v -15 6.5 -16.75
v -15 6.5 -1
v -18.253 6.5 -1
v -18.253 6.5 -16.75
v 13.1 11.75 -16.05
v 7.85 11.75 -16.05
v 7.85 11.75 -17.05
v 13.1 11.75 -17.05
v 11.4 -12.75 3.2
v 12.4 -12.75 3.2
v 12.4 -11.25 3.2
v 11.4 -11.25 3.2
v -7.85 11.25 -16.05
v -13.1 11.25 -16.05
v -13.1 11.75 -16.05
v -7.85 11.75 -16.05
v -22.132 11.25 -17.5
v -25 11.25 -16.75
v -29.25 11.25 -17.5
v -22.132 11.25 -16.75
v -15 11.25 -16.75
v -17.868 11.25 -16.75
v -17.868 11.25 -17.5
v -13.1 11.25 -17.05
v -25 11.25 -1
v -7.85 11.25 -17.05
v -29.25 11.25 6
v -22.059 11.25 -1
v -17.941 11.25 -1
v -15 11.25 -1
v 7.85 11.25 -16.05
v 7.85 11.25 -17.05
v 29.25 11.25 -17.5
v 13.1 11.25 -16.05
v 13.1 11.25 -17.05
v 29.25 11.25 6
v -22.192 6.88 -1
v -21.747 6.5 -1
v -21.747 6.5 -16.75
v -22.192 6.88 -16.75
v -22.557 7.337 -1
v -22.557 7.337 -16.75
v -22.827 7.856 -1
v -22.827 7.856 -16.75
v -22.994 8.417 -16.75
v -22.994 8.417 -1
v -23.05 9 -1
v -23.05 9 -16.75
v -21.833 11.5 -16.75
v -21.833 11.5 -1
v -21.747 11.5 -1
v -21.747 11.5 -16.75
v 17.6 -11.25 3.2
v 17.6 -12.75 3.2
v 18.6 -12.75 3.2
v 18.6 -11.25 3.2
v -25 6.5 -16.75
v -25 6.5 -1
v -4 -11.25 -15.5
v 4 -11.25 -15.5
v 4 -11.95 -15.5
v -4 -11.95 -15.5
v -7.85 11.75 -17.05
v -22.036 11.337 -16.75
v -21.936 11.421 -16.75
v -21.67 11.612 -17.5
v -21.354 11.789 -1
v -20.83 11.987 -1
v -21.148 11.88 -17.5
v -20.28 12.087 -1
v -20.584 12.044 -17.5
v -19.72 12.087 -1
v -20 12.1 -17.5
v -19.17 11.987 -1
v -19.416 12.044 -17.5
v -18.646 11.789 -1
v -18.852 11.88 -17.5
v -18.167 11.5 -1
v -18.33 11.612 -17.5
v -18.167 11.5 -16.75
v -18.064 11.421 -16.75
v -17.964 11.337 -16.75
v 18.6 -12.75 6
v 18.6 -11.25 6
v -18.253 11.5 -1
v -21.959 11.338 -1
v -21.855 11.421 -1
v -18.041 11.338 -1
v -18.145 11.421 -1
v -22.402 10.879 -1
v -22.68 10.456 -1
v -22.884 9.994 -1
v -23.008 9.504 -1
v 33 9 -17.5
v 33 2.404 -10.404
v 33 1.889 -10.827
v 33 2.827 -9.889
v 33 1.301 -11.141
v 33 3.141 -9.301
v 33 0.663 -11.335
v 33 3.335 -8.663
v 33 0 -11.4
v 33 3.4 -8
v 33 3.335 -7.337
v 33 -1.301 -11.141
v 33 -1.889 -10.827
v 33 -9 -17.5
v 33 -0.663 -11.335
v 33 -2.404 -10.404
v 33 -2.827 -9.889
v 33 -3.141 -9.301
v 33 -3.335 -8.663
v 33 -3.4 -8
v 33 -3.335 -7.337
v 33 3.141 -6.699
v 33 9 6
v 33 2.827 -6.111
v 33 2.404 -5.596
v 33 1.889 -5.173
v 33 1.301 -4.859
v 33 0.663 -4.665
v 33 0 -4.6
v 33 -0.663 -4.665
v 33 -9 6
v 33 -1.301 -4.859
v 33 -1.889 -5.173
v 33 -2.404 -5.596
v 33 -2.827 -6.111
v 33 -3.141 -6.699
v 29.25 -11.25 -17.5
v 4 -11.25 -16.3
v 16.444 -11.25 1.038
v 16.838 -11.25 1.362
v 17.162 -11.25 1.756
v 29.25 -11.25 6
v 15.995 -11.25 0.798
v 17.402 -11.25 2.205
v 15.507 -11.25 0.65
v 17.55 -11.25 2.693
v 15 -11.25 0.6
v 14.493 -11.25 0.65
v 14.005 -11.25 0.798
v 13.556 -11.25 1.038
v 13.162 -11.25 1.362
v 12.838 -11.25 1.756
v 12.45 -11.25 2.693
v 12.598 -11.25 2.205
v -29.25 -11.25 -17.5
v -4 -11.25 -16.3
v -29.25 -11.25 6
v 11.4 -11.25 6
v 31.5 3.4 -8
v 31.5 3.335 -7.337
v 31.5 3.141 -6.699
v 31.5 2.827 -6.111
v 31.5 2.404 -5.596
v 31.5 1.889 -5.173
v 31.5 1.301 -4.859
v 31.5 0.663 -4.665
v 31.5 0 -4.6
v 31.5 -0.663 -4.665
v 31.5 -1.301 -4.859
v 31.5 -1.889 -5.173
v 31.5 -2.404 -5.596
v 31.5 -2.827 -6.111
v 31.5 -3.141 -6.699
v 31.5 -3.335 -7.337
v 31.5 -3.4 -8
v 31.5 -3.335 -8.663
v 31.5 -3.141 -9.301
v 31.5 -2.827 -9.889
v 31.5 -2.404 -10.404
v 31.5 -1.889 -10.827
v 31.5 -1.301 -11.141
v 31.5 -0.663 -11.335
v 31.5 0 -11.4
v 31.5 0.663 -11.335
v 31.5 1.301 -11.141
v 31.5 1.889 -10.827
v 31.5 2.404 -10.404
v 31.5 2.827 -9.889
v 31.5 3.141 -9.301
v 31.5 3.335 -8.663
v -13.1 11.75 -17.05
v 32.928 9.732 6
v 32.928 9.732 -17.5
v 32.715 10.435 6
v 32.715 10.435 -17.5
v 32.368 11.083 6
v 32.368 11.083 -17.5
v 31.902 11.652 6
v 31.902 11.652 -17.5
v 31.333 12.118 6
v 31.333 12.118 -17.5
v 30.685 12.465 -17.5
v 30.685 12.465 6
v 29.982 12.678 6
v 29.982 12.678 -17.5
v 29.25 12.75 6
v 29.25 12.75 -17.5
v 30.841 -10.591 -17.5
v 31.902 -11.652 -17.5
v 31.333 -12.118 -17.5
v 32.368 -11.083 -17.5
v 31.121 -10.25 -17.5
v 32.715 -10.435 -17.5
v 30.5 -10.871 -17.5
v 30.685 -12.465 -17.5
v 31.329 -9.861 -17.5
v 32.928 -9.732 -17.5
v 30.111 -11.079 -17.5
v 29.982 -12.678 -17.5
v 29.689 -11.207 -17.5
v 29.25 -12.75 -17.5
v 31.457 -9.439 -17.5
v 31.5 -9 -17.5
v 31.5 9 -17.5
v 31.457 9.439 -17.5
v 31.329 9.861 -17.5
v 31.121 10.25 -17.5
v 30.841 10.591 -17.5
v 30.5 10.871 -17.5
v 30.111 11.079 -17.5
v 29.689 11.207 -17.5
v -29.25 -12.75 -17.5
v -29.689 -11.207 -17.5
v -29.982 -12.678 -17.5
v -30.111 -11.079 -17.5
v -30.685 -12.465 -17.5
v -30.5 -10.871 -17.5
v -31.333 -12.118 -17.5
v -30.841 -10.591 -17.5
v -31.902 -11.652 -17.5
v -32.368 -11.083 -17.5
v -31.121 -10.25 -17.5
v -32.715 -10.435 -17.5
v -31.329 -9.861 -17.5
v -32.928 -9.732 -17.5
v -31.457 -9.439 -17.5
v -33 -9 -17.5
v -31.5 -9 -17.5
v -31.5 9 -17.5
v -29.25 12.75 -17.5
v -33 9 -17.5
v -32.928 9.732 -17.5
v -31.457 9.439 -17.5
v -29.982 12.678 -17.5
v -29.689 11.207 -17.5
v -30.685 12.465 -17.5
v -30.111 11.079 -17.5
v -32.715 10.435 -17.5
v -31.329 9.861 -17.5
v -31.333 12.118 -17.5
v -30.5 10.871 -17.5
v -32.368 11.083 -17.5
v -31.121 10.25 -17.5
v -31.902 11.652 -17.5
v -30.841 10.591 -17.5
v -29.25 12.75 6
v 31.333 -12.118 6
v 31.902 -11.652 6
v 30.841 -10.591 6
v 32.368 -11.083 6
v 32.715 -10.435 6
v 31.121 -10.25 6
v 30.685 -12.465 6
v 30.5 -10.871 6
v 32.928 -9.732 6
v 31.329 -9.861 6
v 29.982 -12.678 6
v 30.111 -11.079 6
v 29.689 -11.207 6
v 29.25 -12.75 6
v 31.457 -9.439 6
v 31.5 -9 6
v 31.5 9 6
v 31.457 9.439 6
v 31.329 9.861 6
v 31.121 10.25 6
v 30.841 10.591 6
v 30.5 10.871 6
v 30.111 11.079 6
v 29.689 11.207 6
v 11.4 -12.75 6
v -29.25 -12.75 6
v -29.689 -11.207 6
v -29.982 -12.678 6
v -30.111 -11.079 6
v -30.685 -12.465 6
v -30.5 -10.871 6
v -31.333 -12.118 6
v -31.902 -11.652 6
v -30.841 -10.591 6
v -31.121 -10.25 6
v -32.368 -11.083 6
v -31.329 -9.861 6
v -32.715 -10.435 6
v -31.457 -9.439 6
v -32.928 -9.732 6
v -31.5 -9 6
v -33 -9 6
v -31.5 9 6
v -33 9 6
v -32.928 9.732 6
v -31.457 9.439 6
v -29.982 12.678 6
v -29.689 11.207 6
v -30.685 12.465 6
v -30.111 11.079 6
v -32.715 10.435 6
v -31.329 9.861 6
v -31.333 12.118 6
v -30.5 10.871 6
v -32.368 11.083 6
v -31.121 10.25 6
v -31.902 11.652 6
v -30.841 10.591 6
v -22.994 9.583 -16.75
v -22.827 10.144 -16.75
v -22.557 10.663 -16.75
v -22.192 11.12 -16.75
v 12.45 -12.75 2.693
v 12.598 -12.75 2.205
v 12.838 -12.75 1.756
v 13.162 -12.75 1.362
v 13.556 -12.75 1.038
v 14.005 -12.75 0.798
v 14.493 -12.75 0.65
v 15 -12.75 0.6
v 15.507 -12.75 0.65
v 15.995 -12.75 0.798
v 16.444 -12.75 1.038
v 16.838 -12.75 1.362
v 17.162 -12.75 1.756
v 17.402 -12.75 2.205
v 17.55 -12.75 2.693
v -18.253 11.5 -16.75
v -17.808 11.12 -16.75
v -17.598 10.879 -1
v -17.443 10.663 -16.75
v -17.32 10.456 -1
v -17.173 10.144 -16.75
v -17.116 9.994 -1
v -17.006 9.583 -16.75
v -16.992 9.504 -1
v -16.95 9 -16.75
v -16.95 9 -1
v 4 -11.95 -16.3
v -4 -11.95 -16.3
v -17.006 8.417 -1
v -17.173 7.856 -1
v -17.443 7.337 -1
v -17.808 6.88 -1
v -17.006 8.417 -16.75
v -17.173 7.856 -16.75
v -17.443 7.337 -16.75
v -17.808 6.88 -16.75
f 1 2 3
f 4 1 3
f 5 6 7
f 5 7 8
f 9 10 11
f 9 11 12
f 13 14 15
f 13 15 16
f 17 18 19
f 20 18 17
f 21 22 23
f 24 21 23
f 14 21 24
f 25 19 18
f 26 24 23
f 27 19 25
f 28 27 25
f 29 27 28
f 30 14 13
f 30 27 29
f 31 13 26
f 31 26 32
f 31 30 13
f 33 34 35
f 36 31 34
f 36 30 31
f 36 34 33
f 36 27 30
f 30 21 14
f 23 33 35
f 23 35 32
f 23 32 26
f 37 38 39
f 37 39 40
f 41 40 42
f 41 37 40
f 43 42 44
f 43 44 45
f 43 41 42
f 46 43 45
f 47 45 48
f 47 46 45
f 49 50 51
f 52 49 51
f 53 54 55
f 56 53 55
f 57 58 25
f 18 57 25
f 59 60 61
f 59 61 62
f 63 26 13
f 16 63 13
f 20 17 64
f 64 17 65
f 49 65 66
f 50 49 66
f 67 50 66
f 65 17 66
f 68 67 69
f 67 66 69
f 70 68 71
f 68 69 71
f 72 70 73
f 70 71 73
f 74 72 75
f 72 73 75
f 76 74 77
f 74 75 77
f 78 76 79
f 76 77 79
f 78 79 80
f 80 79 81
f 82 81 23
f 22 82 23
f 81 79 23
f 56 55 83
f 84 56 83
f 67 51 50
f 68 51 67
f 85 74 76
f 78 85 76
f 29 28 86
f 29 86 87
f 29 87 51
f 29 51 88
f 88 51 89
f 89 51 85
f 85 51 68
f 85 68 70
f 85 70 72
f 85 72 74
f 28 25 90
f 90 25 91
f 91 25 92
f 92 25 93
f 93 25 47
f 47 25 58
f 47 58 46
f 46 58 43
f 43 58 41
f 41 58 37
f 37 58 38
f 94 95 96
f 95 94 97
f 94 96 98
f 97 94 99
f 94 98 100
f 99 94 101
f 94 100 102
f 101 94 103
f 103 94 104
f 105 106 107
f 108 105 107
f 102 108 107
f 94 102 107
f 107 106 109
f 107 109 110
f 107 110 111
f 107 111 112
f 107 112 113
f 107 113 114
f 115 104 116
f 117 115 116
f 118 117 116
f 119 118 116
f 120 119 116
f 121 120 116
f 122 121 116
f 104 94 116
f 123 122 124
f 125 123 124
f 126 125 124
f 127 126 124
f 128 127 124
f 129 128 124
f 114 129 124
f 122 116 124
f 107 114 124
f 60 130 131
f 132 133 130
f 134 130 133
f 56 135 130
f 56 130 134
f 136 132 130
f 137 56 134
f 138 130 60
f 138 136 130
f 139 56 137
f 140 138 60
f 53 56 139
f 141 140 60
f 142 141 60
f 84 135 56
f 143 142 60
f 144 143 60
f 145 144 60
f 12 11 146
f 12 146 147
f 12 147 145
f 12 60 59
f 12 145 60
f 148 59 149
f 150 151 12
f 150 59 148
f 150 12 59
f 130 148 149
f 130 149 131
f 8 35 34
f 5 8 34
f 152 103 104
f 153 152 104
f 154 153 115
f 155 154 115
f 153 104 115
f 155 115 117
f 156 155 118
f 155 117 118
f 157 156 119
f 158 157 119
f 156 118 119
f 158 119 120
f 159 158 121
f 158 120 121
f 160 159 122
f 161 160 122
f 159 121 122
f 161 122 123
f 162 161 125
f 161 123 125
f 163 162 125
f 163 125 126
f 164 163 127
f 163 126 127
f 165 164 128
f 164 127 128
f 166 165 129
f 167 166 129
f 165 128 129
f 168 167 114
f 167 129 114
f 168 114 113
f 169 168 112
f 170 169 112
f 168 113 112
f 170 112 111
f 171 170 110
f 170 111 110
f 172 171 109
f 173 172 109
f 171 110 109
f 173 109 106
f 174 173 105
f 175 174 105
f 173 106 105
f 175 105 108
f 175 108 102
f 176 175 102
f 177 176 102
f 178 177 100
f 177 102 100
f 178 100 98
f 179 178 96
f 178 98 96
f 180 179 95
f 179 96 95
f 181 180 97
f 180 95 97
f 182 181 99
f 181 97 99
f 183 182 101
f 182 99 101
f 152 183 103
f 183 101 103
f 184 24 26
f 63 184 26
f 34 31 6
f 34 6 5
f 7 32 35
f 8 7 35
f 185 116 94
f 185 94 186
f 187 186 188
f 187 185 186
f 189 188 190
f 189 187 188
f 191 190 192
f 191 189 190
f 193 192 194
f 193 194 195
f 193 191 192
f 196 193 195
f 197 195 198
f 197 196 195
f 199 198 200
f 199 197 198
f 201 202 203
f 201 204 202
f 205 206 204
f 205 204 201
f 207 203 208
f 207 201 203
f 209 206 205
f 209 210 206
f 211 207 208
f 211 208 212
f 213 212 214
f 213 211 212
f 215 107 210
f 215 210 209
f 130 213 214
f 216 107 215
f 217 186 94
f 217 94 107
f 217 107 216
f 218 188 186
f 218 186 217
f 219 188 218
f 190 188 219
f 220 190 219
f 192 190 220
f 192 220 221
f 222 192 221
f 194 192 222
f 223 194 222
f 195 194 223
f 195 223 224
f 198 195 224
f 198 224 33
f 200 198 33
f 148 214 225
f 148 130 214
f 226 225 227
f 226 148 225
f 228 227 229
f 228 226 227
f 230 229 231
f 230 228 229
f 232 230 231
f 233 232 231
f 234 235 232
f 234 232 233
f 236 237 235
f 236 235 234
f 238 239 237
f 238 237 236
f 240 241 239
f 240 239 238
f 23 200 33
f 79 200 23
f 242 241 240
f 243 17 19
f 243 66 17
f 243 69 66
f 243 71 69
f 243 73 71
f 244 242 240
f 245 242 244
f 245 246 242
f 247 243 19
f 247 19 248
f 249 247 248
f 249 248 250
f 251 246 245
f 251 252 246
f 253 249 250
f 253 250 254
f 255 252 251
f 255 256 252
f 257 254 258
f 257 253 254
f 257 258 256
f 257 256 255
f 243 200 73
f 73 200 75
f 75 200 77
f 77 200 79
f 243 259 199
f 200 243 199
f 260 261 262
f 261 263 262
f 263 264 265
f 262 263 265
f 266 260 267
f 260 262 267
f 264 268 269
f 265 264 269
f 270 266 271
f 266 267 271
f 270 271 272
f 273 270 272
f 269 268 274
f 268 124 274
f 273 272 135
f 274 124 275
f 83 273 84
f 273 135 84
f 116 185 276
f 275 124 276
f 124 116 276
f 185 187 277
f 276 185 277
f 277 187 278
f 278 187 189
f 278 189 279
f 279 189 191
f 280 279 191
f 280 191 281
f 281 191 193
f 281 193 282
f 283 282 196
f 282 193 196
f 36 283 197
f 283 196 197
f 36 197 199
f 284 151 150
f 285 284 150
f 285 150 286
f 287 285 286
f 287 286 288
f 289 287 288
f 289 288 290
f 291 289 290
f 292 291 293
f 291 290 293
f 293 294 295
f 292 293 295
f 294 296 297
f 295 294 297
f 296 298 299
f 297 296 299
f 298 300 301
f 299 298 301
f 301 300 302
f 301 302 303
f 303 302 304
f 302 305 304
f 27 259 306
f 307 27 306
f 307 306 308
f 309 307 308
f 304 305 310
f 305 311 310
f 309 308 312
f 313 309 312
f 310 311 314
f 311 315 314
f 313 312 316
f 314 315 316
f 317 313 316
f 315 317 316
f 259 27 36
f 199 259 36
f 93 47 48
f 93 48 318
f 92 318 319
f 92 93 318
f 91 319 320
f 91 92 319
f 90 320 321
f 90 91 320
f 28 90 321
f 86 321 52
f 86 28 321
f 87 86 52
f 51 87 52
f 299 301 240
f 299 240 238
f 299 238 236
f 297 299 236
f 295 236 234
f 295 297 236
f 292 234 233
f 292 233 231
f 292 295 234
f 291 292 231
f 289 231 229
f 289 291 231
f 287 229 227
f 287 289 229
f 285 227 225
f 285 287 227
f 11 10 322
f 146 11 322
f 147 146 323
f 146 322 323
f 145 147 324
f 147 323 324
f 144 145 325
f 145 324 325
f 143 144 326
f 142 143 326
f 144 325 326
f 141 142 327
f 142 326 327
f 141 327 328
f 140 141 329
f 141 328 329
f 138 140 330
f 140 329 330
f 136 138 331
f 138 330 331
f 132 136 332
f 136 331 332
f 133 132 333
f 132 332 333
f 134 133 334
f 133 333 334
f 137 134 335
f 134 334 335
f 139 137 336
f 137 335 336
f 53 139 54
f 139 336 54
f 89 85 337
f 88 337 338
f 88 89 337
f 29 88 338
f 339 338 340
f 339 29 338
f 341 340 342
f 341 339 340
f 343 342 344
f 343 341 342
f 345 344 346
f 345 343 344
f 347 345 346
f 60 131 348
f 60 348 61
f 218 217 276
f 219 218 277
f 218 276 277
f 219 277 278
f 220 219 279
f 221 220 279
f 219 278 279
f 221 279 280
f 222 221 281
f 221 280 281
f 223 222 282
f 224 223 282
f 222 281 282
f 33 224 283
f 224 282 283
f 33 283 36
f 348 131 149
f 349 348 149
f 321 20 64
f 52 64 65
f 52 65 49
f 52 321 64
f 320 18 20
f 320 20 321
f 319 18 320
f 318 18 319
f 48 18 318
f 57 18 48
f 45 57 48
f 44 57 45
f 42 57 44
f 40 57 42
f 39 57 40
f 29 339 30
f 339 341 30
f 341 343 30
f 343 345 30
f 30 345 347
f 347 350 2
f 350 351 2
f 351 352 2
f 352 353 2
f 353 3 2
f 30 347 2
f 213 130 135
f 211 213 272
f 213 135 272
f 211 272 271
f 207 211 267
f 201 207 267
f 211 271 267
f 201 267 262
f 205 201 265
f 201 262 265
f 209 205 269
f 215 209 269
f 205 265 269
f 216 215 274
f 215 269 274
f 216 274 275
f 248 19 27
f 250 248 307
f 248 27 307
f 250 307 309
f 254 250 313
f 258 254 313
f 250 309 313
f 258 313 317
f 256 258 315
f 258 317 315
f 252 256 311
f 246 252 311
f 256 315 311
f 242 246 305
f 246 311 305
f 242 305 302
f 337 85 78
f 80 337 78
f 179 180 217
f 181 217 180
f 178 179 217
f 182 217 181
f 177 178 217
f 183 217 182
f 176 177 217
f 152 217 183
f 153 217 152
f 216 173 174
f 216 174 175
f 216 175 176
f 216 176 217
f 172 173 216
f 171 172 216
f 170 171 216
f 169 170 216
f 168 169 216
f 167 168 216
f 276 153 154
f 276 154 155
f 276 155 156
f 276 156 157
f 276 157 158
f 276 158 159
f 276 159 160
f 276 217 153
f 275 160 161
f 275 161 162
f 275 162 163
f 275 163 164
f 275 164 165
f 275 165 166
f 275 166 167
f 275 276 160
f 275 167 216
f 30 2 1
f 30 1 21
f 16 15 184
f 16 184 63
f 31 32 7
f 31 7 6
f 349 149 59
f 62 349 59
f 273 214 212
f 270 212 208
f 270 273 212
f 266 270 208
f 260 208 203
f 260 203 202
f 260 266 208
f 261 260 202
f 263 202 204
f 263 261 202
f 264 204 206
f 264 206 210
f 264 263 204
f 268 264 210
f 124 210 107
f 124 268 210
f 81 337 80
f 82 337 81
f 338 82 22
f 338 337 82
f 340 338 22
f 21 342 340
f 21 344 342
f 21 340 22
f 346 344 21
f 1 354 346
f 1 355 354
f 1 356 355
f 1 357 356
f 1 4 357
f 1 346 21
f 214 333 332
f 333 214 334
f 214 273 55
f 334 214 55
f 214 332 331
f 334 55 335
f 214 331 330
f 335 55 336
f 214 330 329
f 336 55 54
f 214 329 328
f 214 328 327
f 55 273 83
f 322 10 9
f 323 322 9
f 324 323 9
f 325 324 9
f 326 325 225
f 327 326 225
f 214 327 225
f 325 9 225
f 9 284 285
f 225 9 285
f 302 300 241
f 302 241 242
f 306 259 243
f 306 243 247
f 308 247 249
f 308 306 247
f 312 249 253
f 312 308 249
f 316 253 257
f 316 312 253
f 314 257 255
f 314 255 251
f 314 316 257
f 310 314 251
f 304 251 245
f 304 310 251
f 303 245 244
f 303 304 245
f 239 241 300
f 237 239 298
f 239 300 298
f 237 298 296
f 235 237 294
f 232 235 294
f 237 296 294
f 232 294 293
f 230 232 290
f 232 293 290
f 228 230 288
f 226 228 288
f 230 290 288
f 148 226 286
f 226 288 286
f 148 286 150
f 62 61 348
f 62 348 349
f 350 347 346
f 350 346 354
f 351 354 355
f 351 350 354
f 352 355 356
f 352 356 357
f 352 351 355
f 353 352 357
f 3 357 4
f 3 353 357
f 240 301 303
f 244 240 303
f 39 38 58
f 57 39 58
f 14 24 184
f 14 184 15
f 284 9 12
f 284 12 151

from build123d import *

# Parameters (mm, degrees)
PAD_DEPTH       = 23.5
SKETCH014_W     = 8
SKETCH014_H     = 0.8
POCKET001_DEPTH = 0.7
SKETCH015_W     = 5.25
SKETCH015_H     = 1
POCKET002_DEPTH = 0.5
SKETCH020_R     = 3.4
POCKET005_DEPTH = 1.5
POCKET006_DEPTH = 1.5
SKETCH025_R     = 3.1
POCKET008_DEPTH = 16.5
PAD015_DEPTH    = 15.75


with BuildPart() as part:
    # Sketch → Pad (new body)
    with BuildSketch(Plane.XY.offset(6)):
        with BuildLine():
            Line((-29.25, 12.75), (29.25, 12.75))
            ThreePointArc((33, 9), (31.9016504294, 11.6516504294), (29.25, 12.75))
            Line((33, 9), (33, -9))
            ThreePointArc((29.25, -12.75), (31.9016504295, -11.6516504294), (33, -9))
            Line((29.25, -12.75), (-29.25, -12.75))
            ThreePointArc((-33, -9), (-31.9016504294, -11.6516504295), (-29.25, -12.75))
            Line((-33, -9), (-33, 9))
            ThreePointArc((-29.25, 12.75), (-31.9016504294, 11.6516504294), (-33, 9))
        make_face()
        with BuildLine():
            Line((-29.25, 11.25), (29.25, 11.25))
            ThreePointArc((31.5, 9), (30.8409902577, 10.5909902577), (29.25, 11.25))
            Line((31.5, 9), (31.5, -9))
            ThreePointArc((29.25, -11.25), (30.8409902577, -10.5909902577), (31.5, -9))
            Line((29.25, -11.25), (-29.25, -11.25))
            ThreePointArc((-31.5, -9), (-30.8409902577, -10.5909902577), (-29.25, -11.25))
            Line((-31.5, -9), (-31.5, 9))
            ThreePointArc((-29.25, 11.25), (-30.8409902577, 10.5909902577), (-31.5, 9))
        make_face(mode=Mode.SUBTRACT)
    extrude(amount=-PAD_DEPTH)

    # Sketch014 → Pocket001 (cut)
    with BuildSketch(Plane(origin=(0, -11.25, 6), x_dir=(-1, 0, 0), z_dir=(0, 1, 0))):
        with Locations((0, -21.9)):
            Rectangle(SKETCH014_W, SKETCH014_H)
    extrude(amount=-POCKET001_DEPTH, mode=Mode.SUBTRACT)

    # Sketch015 → Pocket002 (cut)
    with BuildSketch(Plane(origin=(0, 11.25, 6), x_dir=(1, 0, 0), z_dir=(0, -1, 0))):
        with Locations((-10.475, -22.55)):
            Rectangle(SKETCH015_W, SKETCH015_H)
        with Locations((10.475, -22.55)):
            Rectangle(SKETCH015_W, SKETCH015_H)
    extrude(amount=-POCKET002_DEPTH, mode=Mode.SUBTRACT)

    # Sketch020 → Pocket005 (cut)
    with BuildSketch(Plane(origin=(33, 0, 6), x_dir=(0, 1, 0), z_dir=(1, 0, 0))):
        with Locations((0, -14)):
            Circle(SKETCH020_R)
    extrude(amount=-POCKET005_DEPTH, mode=Mode.SUBTRACT)

    # Sketch022 → Pocket006 (cut)
    with BuildSketch(Plane(origin=(0, -12.75, 6), x_dir=(1, 0, 0), z_dir=(0, -1, 0))):
        with BuildLine():
            ThreePointArc((12.4, -2.8), (15, -5.4), (17.6, -2.8))
            Line((17.6, -2.8), (18.6, -2.8))
            Line((18.6, -2.8), (18.6, 0.1))
            Line((11.4, 0.1), (18.6, 0.1))
            Line((11.4, -2.8), (11.4, 0.1))
            Line((12.4, -2.8), (11.4, -2.8))
        make_face()
    extrude(amount=-POCKET006_DEPTH, mode=Mode.SUBTRACT)

    # Sketch025 → Pocket008 (cut)
    with BuildSketch(Plane(origin=(0, 0, -17.5), x_dir=(1, 0, 0), z_dir=(0, 0, -1))):
        with Locations((-20, -9)):
            Circle(SKETCH025_R)
    extrude(amount=-POCKET008_DEPTH, mode=Mode.SUBTRACT)

    # Sketch026 → Pad015 (new body)
    with BuildSketch(Plane(origin=(0, 0, -1), x_dir=(1, 0, 0), z_dir=(0, 0, -1))):
        with BuildLine():
            Line((-15, -6.5), (-18.252859479, -6.5))
            ThreePointArc((-16.95, -9), (-17.2952561499, -7.5904395346), (-18.252859479, -6.5))
            ThreePointArc((-18.252859479, -11.5), (-17.2952561499, -10.4095604654), (-16.95, -9))
            Line((-18.252859479, -11.5), (-15, -11.5))
            Line((-15, -6.5), (-15, -11.5))
        make_face()
        with BuildLine():
            Line((-25, -11.5), (-21.747140521, -11.5))
            ThreePointArc((-23.05, -9), (-22.7047438501, -10.4095604654), (-21.747140521, -11.5))
            ThreePointArc((-21.747140521, -6.5), (-22.7047438501, -7.5904395346), (-23.05, -9))
            Line((-21.747140521, -6.5), (-25, -6.5))
            Line((-25, -6.5), (-25, -11.5))
        make_face()
    extrude(amount=PAD015_DEPTH)


solid = part.part
